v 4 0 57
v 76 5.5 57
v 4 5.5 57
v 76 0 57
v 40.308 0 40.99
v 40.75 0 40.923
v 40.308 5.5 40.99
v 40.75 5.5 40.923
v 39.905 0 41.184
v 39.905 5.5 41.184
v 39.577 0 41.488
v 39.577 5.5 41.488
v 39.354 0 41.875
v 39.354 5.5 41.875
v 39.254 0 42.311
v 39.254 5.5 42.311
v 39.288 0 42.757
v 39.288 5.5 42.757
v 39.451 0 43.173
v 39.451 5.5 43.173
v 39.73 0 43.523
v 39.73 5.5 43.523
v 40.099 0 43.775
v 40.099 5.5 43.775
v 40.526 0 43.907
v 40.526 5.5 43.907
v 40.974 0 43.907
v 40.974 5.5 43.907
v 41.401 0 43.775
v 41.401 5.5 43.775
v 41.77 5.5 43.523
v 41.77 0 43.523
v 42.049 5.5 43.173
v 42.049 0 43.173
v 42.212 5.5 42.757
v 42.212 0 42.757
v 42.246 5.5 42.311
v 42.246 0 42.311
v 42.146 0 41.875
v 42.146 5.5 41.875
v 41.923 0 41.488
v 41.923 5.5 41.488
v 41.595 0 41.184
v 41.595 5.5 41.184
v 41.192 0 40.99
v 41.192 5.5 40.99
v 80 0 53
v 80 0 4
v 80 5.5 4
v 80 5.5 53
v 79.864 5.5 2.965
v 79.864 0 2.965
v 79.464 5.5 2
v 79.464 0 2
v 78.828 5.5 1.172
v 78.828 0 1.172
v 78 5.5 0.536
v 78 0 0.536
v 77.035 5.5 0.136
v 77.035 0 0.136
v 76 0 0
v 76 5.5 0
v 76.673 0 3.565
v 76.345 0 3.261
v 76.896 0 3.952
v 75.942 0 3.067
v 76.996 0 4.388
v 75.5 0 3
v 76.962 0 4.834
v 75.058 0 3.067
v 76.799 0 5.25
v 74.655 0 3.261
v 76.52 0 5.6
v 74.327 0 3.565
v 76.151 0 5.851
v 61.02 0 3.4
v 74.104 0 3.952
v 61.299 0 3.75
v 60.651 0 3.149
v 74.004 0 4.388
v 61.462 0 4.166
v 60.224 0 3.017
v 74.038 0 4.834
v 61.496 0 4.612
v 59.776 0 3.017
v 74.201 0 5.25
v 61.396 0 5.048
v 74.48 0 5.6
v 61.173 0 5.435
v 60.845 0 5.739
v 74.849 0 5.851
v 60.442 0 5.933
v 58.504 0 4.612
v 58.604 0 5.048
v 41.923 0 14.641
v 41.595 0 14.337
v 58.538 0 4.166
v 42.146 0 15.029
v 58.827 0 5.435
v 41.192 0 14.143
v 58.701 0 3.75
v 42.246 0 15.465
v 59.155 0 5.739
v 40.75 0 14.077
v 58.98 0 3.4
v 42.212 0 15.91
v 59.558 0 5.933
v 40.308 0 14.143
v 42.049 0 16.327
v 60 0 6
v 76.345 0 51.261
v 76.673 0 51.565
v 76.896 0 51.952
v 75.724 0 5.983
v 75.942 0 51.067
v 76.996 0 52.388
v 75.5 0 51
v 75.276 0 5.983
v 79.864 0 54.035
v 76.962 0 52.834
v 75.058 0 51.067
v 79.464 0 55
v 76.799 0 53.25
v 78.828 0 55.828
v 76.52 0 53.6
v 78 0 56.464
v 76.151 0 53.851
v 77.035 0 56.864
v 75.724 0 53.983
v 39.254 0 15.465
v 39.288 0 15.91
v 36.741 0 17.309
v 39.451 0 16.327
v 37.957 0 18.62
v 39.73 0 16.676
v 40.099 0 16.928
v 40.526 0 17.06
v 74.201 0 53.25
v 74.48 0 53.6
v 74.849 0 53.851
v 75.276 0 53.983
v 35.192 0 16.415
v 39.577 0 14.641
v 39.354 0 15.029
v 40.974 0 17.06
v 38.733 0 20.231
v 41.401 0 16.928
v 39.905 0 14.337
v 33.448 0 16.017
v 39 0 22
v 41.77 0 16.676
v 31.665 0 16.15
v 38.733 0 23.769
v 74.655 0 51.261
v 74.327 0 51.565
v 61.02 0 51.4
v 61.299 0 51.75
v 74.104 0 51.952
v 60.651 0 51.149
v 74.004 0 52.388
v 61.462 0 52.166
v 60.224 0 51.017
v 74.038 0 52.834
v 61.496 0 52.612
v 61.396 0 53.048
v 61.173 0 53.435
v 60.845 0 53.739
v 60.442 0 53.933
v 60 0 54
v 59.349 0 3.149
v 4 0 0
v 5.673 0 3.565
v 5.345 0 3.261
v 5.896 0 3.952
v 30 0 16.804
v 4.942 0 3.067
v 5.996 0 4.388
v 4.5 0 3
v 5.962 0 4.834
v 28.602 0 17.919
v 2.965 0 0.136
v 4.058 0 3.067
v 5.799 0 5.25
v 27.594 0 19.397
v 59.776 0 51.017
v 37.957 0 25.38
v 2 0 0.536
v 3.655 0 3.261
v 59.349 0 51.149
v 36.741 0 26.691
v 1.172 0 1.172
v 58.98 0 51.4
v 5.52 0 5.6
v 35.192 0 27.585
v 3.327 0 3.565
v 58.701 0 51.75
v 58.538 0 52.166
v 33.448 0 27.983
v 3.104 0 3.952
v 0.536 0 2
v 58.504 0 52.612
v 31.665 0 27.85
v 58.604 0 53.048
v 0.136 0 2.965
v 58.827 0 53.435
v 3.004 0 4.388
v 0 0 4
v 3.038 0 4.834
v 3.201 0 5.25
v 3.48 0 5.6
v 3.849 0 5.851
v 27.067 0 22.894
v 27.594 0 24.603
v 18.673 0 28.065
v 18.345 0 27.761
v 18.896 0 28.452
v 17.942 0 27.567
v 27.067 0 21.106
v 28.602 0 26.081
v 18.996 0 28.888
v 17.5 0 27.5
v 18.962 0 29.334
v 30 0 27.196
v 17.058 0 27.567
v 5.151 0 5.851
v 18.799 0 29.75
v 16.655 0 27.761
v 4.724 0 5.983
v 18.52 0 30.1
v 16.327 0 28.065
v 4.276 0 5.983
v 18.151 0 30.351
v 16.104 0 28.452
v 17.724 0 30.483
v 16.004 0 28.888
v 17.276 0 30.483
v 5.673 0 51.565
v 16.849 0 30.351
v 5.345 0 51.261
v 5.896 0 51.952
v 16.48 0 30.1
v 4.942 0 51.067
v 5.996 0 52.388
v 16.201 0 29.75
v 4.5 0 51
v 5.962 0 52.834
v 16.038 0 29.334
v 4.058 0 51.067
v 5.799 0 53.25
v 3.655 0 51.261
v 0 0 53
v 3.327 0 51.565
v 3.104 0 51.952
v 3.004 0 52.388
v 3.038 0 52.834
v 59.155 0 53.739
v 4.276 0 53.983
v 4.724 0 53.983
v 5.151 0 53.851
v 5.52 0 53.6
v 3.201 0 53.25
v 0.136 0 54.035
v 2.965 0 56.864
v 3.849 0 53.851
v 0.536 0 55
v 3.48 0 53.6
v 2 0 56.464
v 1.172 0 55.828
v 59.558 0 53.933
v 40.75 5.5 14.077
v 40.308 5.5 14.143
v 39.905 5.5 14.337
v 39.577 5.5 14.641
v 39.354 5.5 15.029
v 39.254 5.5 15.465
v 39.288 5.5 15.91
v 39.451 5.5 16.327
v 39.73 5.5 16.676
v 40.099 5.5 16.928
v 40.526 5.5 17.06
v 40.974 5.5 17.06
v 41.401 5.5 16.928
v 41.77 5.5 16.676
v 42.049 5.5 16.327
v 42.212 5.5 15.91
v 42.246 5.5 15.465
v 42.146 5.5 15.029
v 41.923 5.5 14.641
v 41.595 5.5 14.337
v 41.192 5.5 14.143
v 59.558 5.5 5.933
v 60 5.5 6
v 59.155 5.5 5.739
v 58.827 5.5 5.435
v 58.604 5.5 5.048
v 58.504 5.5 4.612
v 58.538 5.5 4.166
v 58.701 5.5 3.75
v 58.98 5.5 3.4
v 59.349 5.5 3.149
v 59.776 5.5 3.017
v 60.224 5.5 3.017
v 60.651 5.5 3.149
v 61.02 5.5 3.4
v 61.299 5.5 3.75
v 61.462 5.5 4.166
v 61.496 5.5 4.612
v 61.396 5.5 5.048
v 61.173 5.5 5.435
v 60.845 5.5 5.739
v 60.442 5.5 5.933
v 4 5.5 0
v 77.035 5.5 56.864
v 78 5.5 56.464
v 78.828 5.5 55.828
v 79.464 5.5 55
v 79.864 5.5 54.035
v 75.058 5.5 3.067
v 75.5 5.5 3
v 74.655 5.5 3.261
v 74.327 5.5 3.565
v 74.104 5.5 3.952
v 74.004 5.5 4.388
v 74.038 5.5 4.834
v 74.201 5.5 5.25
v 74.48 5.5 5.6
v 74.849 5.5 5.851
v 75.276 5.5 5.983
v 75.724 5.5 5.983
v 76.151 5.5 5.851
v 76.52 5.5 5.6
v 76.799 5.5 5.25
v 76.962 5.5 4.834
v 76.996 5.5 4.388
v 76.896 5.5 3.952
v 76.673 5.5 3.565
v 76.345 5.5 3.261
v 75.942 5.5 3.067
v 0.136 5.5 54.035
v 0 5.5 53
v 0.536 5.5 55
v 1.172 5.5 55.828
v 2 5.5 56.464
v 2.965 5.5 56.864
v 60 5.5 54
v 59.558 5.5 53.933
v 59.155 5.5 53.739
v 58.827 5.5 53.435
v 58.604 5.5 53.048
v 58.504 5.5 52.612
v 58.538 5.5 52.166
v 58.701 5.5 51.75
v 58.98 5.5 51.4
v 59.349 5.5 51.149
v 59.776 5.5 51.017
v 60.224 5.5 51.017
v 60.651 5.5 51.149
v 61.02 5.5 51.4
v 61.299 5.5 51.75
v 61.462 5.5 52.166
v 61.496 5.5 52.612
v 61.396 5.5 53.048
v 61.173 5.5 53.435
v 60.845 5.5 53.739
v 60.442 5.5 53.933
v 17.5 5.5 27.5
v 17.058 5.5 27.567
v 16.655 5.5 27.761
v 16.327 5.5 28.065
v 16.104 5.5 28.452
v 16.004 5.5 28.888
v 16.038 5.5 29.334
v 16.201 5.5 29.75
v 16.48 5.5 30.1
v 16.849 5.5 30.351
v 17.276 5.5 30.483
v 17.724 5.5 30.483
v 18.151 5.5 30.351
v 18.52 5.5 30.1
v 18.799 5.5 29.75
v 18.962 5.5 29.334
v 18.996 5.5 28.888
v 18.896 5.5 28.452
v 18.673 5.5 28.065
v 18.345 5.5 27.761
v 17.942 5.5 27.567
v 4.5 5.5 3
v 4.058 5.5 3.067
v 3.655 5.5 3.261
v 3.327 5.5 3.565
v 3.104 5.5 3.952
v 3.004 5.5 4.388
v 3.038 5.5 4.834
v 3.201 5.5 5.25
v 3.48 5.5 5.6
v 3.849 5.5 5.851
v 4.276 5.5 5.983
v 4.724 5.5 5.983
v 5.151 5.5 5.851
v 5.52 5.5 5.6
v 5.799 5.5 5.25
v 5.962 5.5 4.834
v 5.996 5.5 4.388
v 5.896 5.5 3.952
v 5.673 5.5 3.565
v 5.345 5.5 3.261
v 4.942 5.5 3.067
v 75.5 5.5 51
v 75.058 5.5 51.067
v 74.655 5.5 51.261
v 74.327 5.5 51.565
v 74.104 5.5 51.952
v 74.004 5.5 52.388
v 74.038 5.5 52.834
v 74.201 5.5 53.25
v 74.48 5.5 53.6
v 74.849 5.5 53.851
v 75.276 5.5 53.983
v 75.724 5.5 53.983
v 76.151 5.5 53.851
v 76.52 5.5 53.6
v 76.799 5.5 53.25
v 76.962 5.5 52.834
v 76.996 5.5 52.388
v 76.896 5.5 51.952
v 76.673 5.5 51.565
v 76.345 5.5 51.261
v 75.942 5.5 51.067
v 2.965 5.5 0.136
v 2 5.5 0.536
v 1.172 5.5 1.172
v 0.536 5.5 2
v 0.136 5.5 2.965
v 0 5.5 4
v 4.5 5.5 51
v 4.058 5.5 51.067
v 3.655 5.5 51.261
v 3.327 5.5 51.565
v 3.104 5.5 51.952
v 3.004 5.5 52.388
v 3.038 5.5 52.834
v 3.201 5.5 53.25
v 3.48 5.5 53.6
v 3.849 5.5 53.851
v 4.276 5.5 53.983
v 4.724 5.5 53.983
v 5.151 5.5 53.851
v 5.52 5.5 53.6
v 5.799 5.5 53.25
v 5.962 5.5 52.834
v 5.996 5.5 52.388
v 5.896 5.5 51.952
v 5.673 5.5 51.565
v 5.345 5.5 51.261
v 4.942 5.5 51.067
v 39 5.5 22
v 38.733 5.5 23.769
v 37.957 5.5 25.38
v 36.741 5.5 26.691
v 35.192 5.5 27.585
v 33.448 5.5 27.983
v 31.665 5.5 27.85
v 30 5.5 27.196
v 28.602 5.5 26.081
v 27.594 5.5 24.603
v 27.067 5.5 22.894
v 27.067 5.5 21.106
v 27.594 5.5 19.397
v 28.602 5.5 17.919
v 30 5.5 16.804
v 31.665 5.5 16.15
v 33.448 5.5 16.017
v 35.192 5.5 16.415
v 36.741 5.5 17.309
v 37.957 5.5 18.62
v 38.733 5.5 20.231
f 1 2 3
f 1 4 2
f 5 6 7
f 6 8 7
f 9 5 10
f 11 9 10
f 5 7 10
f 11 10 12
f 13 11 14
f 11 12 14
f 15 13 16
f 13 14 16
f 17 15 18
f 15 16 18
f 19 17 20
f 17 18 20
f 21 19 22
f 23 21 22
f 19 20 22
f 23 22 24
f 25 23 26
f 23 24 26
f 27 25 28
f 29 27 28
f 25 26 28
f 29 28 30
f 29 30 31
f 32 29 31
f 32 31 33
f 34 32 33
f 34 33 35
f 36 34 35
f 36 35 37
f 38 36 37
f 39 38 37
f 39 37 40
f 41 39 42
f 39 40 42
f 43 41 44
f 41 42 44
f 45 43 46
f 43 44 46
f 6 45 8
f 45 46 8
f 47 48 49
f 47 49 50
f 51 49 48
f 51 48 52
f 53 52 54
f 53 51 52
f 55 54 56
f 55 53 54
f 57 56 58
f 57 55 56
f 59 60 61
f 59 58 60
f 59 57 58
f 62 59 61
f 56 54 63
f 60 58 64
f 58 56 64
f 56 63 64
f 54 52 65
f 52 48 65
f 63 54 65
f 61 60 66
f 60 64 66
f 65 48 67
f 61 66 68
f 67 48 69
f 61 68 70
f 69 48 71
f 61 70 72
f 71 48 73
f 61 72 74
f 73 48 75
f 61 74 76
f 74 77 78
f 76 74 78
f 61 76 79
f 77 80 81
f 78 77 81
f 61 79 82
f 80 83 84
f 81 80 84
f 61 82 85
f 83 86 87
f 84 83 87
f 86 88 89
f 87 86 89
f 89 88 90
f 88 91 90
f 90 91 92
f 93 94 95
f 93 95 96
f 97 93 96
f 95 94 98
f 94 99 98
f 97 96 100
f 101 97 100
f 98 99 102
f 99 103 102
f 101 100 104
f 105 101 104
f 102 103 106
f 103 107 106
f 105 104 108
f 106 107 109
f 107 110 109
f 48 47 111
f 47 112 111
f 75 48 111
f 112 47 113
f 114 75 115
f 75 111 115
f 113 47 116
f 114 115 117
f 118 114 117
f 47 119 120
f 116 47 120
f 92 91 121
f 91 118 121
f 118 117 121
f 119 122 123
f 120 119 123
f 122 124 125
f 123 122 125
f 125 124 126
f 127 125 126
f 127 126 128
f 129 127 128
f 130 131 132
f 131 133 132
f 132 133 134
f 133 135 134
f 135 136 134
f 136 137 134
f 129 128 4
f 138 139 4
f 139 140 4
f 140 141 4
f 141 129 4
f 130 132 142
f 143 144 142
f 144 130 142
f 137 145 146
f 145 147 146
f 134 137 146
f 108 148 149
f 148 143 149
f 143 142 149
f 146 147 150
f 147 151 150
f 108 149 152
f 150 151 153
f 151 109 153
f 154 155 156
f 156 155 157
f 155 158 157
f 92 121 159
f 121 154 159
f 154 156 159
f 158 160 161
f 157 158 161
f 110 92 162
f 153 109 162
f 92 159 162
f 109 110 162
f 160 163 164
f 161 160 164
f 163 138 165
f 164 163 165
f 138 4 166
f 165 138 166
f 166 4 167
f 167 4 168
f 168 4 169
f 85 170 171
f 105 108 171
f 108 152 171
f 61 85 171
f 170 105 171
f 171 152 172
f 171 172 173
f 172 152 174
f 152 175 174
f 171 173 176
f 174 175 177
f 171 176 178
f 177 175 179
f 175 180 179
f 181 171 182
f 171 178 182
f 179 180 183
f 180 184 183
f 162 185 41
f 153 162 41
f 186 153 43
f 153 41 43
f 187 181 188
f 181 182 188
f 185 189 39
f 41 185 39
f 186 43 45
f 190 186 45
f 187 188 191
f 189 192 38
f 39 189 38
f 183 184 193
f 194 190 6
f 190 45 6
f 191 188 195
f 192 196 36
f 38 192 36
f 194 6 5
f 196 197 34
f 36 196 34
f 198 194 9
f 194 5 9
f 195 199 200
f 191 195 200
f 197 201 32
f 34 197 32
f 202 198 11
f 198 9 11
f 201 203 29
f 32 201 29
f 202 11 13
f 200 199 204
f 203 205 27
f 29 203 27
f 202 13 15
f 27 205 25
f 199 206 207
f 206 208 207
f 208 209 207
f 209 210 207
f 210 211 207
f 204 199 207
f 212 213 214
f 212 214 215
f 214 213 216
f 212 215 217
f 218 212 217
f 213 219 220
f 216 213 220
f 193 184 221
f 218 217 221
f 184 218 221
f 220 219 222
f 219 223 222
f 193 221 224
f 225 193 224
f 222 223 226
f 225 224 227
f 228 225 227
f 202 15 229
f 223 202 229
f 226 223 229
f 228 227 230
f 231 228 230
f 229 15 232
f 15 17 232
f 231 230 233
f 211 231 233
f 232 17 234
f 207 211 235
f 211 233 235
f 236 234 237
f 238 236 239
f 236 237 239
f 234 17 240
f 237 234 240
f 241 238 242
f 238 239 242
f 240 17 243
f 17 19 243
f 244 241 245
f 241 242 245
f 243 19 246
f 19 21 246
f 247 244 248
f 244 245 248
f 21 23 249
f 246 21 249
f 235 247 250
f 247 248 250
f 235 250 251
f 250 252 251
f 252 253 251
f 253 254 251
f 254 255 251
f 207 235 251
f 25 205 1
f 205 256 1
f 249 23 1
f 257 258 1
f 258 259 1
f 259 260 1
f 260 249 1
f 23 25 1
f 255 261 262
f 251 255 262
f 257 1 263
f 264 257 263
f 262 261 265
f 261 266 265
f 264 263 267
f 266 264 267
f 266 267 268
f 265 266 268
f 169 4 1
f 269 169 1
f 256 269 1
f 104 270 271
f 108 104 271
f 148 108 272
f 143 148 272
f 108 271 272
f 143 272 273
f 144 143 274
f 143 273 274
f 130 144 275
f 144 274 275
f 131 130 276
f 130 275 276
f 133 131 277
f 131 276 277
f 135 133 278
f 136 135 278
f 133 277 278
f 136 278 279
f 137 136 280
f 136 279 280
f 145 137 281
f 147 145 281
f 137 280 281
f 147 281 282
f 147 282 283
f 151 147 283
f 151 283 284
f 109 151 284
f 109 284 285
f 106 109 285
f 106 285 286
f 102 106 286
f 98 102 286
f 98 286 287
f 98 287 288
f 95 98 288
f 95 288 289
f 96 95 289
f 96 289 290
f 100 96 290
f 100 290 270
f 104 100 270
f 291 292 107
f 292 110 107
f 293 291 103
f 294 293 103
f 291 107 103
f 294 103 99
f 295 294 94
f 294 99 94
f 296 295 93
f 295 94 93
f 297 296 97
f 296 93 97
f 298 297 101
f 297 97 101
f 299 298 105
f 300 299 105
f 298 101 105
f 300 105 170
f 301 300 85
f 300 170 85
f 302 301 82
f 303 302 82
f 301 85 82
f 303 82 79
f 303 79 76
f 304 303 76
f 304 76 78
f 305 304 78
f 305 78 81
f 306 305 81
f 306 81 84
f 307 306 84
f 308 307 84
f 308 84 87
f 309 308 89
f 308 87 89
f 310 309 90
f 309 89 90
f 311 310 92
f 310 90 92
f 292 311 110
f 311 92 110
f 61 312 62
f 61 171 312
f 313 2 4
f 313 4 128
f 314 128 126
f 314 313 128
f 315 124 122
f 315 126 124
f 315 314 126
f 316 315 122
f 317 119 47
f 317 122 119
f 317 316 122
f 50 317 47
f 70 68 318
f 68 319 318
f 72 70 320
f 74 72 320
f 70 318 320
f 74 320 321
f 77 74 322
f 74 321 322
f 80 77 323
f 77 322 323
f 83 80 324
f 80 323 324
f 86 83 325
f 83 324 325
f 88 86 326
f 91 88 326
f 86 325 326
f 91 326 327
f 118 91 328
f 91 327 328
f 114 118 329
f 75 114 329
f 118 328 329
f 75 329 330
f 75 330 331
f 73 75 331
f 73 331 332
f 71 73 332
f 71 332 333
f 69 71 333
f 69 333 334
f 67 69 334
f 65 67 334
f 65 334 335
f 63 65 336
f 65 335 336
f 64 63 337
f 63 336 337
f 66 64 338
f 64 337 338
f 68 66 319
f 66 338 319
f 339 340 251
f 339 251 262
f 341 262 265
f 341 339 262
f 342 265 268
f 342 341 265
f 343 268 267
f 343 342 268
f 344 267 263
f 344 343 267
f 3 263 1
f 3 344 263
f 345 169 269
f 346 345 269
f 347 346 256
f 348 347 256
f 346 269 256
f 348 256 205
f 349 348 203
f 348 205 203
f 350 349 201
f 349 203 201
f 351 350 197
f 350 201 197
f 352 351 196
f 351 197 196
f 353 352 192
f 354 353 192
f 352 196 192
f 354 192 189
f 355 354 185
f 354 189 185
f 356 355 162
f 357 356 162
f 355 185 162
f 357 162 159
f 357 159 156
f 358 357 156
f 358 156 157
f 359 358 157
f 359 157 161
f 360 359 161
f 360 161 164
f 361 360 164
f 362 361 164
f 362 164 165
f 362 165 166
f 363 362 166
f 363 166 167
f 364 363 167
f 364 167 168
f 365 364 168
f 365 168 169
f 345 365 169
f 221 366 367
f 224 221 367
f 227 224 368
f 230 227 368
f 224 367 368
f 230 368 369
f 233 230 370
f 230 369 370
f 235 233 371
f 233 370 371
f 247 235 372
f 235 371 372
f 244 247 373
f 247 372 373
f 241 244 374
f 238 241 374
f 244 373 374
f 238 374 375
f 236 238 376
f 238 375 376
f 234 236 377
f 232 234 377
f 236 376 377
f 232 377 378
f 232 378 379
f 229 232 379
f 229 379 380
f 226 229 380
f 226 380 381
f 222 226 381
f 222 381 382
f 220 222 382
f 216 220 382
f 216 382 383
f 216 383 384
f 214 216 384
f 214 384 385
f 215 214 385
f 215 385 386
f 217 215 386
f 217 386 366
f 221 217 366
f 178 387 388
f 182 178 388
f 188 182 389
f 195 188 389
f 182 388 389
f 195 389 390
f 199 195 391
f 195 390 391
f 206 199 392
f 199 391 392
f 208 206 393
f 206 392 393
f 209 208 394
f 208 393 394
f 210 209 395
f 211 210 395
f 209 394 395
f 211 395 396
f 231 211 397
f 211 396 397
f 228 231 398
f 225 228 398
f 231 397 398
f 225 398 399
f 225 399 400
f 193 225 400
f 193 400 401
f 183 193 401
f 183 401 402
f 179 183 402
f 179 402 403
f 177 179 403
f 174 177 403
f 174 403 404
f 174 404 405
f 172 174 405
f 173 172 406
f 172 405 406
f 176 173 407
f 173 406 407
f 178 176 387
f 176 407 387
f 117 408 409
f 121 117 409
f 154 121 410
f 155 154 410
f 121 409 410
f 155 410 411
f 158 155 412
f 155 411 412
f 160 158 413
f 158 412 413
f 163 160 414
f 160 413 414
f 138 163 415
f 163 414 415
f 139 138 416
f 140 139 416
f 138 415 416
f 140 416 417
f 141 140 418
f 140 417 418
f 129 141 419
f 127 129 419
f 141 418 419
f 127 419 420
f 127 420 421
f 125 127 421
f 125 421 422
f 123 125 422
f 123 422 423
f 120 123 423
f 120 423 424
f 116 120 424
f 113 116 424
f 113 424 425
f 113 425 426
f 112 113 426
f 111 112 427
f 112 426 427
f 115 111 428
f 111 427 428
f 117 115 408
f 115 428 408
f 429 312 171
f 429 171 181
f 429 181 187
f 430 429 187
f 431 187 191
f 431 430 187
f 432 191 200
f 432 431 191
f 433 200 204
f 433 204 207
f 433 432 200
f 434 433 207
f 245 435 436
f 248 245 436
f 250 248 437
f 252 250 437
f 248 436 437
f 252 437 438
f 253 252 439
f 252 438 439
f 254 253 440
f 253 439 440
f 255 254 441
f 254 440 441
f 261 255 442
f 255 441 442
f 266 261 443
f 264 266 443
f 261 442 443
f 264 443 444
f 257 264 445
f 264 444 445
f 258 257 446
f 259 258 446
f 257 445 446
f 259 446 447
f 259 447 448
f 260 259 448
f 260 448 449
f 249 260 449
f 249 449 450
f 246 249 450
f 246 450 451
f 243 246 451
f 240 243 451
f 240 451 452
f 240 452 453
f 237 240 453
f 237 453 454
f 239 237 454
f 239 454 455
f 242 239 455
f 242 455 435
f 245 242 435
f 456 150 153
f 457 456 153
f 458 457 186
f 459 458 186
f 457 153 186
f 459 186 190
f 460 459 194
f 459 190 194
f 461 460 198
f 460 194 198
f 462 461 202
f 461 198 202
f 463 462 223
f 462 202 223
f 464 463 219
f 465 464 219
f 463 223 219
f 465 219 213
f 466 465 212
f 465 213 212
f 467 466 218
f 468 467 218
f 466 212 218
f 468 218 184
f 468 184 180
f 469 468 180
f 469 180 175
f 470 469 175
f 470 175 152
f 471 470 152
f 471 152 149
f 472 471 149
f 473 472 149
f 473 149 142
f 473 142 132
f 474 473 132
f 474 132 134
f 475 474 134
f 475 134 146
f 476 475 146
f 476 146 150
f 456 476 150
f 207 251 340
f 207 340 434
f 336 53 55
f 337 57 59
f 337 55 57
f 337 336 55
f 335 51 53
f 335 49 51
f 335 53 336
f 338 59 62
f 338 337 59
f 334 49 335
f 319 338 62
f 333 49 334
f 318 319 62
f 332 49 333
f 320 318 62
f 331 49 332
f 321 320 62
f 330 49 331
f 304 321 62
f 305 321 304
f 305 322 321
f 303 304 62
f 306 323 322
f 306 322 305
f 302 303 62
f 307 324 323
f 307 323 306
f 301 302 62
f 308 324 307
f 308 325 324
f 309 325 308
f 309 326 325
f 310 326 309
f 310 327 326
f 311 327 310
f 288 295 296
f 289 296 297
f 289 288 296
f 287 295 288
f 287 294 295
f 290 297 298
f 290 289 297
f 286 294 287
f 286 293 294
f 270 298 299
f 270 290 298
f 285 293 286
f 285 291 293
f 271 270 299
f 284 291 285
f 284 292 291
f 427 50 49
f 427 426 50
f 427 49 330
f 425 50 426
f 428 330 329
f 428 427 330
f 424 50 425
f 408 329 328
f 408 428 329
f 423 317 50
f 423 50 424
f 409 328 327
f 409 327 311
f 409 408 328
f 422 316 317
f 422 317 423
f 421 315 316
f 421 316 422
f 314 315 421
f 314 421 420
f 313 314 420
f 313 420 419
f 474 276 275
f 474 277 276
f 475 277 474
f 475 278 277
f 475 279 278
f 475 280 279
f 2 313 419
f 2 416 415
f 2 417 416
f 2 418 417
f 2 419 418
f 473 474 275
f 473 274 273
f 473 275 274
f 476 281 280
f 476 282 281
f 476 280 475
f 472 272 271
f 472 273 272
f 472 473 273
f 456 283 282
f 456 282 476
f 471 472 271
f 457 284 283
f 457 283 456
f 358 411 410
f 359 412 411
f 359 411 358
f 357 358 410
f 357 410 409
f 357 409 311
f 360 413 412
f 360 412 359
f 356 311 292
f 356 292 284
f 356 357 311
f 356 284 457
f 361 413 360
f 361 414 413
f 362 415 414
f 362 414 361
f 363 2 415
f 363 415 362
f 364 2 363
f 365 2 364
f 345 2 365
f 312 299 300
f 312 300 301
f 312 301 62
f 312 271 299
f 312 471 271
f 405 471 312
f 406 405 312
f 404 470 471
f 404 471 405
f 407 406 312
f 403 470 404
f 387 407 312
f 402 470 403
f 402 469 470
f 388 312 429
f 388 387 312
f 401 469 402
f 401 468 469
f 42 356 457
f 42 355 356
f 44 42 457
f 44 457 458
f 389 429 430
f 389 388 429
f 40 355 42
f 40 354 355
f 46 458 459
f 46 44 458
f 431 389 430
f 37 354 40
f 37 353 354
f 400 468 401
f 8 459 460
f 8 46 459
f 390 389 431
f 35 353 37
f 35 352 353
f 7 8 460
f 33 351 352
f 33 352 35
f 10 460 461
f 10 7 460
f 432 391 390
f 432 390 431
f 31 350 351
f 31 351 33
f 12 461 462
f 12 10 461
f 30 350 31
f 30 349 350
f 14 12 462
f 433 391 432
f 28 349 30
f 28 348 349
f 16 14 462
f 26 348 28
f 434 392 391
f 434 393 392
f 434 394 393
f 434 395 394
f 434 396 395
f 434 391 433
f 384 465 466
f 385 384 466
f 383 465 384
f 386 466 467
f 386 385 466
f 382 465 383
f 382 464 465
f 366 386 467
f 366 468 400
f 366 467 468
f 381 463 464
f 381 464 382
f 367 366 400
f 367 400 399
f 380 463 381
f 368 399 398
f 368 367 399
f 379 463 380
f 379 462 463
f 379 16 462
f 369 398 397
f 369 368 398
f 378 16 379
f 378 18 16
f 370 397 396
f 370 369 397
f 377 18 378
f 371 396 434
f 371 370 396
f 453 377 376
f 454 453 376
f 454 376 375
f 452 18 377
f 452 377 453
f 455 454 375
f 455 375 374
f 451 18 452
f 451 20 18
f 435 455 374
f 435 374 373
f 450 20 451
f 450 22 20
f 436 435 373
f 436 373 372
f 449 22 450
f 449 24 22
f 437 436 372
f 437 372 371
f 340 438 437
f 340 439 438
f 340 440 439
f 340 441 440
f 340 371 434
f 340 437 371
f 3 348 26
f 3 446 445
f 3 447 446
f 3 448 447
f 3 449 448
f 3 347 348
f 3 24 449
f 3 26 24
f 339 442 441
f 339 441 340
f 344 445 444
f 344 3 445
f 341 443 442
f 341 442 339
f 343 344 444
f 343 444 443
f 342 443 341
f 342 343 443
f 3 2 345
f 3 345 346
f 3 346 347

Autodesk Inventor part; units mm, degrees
ref_plane "YZ Plane" through (0, 0, 0) normal (1, 0, 0) x (0, 1, 0)
ref_plane "XZ Plane" through (0, 0, 0) normal (0, 1, 0) x (-1, 0, 0)
ref_plane "XY Plane" through (0, 0, 0) normal (0, 0, 1) x (1, 0, 0)
sketch "スケッチ1" plane through (0, 0, 0) normal (0, 1, 0) x (-1, 0, 0)
  line L0 (0, 0) -> (-80, 0)
  line L1 (-80, 0) -> (-80, 57)
  line L2 (-80, 57) -> (0, 57)
  line L3 (0, 57) -> (0, 0)
  dimension "d2" = 80
  dimension "d3" = 57
extrude "押し出し1" add sketch "スケッチ1" along normal blind 5.5
sketch "スケッチ2" plane through (0, 0, 0) normal (0, -1, 0) x (1, 0, 0)
  line L0 (80, 0) -> (0, 0) projected
  line L1 (80, 57) -> (80, 0) projected
  line L2 (0, 0) -> (0, 57) projected
  line L3 (0, 57) -> (80, 57) projected
  point P0 (75.5, 4.5)
  point P1 (4.5, 4.5)
  point P2 (4.5, 52.5)
  point P3 (75.5, 52.5)
  dimension "d4" = 4.5
  dimension "d5" = 4.5
  dimension "d6" = 4.5
  dimension "d7" = 4.5
  dimension "d8" = 4.5
  dimension "d9" = 4.5
  dimension "d10" = 4.5
  dimension "d11" = 4.5
hole "穴1" at (75.5, 0, 4.5) at (4.5, 0, 4.5) at (4.5, 0, 52.5) at (75.5, 0, 52.5) direction (0, 1, 0) diameter 3 end through all
fillet "フィレット1" radius 4 4 edges at (80, 2.75, 0) (0, 2.75, 0) (80, 2.75, 57) (0, 2.75, 57)
sketch "スケッチ3" plane through (0, 0, 0) normal (0, -1, 0) x (1, 0, 0)
  circle A0 centre (33, 29) radius 15.5
  line L0 (0, 4) -> (0, 53) projected
  line L1 (80, 53) -> (80, 4) projected
  line L2 (4, 57) -> (76, 57) projected
  line L3 (33, 29) -> (17.5, 29)
  line L4 (33, 29) -> (40.75, 15.5766)
  line L5 (33, 29) -> (40.75, 42.4234)
  point P0 (0, 0)
  dimension "d20" = 31
  dimension "d21" = 80
  dimension "d22" = 47
  dimension "d23" = 28
  dimension "d24" = 120
  dimension "d25" = 120
hole "穴2" at (40.75, 0, 15.5766) at (40.75, 0, 42.4234) at (17.5, 0, 29) direction (0, 1, 0) diameter 3 end through all
sketch "スケッチ4" plane through (0, 0, 0) normal (0, -1, 0) x (1, 0, 0)
  circle A0 centre (33, 22) radius 6
  line L0 (80, 53) -> (80, 4) projected
  line L1 (4, 57) -> (76, 57) projected
  point P0 (0, 0)
  dimension "d33" = 12
  dimension "d34" = 47
  dimension "d35" = 35
extrude "押し出し2" cut sketch "スケッチ4" against normal through all
sketch "スケッチ5" plane through (0, 5.5, 0) normal (0, 1, 0) x (1, 0, 0)
  line L0 (4, -57) -> (76, -57) projected
  line L1 (80, -53) -> (80, -4) projected
  line L2 (76, 0) -> (4, 0) projected
  point P0 (0, 0)
  point P1 (60, -52.5)
  point P2 (60, -4.5)
  dimension "d38" = 4.5
  dimension "d39" = 20
  dimension "d40" = 20
  dimension "d41" = 4.5
hole "穴3" at (60, 5.5, 52.5) at (60, 5.5, 4.5) direction (0, -1, 0) diameter 3 end through all
equation "\"d7\" = d5"
equation "\"d8\" = d5"
equation "\"d9\" = d5"
equation "\"d10\" = d5"
equation "\"d11\" = d5"
properties part number "上下直動t5.5" material "木材 (カエデ材)"
